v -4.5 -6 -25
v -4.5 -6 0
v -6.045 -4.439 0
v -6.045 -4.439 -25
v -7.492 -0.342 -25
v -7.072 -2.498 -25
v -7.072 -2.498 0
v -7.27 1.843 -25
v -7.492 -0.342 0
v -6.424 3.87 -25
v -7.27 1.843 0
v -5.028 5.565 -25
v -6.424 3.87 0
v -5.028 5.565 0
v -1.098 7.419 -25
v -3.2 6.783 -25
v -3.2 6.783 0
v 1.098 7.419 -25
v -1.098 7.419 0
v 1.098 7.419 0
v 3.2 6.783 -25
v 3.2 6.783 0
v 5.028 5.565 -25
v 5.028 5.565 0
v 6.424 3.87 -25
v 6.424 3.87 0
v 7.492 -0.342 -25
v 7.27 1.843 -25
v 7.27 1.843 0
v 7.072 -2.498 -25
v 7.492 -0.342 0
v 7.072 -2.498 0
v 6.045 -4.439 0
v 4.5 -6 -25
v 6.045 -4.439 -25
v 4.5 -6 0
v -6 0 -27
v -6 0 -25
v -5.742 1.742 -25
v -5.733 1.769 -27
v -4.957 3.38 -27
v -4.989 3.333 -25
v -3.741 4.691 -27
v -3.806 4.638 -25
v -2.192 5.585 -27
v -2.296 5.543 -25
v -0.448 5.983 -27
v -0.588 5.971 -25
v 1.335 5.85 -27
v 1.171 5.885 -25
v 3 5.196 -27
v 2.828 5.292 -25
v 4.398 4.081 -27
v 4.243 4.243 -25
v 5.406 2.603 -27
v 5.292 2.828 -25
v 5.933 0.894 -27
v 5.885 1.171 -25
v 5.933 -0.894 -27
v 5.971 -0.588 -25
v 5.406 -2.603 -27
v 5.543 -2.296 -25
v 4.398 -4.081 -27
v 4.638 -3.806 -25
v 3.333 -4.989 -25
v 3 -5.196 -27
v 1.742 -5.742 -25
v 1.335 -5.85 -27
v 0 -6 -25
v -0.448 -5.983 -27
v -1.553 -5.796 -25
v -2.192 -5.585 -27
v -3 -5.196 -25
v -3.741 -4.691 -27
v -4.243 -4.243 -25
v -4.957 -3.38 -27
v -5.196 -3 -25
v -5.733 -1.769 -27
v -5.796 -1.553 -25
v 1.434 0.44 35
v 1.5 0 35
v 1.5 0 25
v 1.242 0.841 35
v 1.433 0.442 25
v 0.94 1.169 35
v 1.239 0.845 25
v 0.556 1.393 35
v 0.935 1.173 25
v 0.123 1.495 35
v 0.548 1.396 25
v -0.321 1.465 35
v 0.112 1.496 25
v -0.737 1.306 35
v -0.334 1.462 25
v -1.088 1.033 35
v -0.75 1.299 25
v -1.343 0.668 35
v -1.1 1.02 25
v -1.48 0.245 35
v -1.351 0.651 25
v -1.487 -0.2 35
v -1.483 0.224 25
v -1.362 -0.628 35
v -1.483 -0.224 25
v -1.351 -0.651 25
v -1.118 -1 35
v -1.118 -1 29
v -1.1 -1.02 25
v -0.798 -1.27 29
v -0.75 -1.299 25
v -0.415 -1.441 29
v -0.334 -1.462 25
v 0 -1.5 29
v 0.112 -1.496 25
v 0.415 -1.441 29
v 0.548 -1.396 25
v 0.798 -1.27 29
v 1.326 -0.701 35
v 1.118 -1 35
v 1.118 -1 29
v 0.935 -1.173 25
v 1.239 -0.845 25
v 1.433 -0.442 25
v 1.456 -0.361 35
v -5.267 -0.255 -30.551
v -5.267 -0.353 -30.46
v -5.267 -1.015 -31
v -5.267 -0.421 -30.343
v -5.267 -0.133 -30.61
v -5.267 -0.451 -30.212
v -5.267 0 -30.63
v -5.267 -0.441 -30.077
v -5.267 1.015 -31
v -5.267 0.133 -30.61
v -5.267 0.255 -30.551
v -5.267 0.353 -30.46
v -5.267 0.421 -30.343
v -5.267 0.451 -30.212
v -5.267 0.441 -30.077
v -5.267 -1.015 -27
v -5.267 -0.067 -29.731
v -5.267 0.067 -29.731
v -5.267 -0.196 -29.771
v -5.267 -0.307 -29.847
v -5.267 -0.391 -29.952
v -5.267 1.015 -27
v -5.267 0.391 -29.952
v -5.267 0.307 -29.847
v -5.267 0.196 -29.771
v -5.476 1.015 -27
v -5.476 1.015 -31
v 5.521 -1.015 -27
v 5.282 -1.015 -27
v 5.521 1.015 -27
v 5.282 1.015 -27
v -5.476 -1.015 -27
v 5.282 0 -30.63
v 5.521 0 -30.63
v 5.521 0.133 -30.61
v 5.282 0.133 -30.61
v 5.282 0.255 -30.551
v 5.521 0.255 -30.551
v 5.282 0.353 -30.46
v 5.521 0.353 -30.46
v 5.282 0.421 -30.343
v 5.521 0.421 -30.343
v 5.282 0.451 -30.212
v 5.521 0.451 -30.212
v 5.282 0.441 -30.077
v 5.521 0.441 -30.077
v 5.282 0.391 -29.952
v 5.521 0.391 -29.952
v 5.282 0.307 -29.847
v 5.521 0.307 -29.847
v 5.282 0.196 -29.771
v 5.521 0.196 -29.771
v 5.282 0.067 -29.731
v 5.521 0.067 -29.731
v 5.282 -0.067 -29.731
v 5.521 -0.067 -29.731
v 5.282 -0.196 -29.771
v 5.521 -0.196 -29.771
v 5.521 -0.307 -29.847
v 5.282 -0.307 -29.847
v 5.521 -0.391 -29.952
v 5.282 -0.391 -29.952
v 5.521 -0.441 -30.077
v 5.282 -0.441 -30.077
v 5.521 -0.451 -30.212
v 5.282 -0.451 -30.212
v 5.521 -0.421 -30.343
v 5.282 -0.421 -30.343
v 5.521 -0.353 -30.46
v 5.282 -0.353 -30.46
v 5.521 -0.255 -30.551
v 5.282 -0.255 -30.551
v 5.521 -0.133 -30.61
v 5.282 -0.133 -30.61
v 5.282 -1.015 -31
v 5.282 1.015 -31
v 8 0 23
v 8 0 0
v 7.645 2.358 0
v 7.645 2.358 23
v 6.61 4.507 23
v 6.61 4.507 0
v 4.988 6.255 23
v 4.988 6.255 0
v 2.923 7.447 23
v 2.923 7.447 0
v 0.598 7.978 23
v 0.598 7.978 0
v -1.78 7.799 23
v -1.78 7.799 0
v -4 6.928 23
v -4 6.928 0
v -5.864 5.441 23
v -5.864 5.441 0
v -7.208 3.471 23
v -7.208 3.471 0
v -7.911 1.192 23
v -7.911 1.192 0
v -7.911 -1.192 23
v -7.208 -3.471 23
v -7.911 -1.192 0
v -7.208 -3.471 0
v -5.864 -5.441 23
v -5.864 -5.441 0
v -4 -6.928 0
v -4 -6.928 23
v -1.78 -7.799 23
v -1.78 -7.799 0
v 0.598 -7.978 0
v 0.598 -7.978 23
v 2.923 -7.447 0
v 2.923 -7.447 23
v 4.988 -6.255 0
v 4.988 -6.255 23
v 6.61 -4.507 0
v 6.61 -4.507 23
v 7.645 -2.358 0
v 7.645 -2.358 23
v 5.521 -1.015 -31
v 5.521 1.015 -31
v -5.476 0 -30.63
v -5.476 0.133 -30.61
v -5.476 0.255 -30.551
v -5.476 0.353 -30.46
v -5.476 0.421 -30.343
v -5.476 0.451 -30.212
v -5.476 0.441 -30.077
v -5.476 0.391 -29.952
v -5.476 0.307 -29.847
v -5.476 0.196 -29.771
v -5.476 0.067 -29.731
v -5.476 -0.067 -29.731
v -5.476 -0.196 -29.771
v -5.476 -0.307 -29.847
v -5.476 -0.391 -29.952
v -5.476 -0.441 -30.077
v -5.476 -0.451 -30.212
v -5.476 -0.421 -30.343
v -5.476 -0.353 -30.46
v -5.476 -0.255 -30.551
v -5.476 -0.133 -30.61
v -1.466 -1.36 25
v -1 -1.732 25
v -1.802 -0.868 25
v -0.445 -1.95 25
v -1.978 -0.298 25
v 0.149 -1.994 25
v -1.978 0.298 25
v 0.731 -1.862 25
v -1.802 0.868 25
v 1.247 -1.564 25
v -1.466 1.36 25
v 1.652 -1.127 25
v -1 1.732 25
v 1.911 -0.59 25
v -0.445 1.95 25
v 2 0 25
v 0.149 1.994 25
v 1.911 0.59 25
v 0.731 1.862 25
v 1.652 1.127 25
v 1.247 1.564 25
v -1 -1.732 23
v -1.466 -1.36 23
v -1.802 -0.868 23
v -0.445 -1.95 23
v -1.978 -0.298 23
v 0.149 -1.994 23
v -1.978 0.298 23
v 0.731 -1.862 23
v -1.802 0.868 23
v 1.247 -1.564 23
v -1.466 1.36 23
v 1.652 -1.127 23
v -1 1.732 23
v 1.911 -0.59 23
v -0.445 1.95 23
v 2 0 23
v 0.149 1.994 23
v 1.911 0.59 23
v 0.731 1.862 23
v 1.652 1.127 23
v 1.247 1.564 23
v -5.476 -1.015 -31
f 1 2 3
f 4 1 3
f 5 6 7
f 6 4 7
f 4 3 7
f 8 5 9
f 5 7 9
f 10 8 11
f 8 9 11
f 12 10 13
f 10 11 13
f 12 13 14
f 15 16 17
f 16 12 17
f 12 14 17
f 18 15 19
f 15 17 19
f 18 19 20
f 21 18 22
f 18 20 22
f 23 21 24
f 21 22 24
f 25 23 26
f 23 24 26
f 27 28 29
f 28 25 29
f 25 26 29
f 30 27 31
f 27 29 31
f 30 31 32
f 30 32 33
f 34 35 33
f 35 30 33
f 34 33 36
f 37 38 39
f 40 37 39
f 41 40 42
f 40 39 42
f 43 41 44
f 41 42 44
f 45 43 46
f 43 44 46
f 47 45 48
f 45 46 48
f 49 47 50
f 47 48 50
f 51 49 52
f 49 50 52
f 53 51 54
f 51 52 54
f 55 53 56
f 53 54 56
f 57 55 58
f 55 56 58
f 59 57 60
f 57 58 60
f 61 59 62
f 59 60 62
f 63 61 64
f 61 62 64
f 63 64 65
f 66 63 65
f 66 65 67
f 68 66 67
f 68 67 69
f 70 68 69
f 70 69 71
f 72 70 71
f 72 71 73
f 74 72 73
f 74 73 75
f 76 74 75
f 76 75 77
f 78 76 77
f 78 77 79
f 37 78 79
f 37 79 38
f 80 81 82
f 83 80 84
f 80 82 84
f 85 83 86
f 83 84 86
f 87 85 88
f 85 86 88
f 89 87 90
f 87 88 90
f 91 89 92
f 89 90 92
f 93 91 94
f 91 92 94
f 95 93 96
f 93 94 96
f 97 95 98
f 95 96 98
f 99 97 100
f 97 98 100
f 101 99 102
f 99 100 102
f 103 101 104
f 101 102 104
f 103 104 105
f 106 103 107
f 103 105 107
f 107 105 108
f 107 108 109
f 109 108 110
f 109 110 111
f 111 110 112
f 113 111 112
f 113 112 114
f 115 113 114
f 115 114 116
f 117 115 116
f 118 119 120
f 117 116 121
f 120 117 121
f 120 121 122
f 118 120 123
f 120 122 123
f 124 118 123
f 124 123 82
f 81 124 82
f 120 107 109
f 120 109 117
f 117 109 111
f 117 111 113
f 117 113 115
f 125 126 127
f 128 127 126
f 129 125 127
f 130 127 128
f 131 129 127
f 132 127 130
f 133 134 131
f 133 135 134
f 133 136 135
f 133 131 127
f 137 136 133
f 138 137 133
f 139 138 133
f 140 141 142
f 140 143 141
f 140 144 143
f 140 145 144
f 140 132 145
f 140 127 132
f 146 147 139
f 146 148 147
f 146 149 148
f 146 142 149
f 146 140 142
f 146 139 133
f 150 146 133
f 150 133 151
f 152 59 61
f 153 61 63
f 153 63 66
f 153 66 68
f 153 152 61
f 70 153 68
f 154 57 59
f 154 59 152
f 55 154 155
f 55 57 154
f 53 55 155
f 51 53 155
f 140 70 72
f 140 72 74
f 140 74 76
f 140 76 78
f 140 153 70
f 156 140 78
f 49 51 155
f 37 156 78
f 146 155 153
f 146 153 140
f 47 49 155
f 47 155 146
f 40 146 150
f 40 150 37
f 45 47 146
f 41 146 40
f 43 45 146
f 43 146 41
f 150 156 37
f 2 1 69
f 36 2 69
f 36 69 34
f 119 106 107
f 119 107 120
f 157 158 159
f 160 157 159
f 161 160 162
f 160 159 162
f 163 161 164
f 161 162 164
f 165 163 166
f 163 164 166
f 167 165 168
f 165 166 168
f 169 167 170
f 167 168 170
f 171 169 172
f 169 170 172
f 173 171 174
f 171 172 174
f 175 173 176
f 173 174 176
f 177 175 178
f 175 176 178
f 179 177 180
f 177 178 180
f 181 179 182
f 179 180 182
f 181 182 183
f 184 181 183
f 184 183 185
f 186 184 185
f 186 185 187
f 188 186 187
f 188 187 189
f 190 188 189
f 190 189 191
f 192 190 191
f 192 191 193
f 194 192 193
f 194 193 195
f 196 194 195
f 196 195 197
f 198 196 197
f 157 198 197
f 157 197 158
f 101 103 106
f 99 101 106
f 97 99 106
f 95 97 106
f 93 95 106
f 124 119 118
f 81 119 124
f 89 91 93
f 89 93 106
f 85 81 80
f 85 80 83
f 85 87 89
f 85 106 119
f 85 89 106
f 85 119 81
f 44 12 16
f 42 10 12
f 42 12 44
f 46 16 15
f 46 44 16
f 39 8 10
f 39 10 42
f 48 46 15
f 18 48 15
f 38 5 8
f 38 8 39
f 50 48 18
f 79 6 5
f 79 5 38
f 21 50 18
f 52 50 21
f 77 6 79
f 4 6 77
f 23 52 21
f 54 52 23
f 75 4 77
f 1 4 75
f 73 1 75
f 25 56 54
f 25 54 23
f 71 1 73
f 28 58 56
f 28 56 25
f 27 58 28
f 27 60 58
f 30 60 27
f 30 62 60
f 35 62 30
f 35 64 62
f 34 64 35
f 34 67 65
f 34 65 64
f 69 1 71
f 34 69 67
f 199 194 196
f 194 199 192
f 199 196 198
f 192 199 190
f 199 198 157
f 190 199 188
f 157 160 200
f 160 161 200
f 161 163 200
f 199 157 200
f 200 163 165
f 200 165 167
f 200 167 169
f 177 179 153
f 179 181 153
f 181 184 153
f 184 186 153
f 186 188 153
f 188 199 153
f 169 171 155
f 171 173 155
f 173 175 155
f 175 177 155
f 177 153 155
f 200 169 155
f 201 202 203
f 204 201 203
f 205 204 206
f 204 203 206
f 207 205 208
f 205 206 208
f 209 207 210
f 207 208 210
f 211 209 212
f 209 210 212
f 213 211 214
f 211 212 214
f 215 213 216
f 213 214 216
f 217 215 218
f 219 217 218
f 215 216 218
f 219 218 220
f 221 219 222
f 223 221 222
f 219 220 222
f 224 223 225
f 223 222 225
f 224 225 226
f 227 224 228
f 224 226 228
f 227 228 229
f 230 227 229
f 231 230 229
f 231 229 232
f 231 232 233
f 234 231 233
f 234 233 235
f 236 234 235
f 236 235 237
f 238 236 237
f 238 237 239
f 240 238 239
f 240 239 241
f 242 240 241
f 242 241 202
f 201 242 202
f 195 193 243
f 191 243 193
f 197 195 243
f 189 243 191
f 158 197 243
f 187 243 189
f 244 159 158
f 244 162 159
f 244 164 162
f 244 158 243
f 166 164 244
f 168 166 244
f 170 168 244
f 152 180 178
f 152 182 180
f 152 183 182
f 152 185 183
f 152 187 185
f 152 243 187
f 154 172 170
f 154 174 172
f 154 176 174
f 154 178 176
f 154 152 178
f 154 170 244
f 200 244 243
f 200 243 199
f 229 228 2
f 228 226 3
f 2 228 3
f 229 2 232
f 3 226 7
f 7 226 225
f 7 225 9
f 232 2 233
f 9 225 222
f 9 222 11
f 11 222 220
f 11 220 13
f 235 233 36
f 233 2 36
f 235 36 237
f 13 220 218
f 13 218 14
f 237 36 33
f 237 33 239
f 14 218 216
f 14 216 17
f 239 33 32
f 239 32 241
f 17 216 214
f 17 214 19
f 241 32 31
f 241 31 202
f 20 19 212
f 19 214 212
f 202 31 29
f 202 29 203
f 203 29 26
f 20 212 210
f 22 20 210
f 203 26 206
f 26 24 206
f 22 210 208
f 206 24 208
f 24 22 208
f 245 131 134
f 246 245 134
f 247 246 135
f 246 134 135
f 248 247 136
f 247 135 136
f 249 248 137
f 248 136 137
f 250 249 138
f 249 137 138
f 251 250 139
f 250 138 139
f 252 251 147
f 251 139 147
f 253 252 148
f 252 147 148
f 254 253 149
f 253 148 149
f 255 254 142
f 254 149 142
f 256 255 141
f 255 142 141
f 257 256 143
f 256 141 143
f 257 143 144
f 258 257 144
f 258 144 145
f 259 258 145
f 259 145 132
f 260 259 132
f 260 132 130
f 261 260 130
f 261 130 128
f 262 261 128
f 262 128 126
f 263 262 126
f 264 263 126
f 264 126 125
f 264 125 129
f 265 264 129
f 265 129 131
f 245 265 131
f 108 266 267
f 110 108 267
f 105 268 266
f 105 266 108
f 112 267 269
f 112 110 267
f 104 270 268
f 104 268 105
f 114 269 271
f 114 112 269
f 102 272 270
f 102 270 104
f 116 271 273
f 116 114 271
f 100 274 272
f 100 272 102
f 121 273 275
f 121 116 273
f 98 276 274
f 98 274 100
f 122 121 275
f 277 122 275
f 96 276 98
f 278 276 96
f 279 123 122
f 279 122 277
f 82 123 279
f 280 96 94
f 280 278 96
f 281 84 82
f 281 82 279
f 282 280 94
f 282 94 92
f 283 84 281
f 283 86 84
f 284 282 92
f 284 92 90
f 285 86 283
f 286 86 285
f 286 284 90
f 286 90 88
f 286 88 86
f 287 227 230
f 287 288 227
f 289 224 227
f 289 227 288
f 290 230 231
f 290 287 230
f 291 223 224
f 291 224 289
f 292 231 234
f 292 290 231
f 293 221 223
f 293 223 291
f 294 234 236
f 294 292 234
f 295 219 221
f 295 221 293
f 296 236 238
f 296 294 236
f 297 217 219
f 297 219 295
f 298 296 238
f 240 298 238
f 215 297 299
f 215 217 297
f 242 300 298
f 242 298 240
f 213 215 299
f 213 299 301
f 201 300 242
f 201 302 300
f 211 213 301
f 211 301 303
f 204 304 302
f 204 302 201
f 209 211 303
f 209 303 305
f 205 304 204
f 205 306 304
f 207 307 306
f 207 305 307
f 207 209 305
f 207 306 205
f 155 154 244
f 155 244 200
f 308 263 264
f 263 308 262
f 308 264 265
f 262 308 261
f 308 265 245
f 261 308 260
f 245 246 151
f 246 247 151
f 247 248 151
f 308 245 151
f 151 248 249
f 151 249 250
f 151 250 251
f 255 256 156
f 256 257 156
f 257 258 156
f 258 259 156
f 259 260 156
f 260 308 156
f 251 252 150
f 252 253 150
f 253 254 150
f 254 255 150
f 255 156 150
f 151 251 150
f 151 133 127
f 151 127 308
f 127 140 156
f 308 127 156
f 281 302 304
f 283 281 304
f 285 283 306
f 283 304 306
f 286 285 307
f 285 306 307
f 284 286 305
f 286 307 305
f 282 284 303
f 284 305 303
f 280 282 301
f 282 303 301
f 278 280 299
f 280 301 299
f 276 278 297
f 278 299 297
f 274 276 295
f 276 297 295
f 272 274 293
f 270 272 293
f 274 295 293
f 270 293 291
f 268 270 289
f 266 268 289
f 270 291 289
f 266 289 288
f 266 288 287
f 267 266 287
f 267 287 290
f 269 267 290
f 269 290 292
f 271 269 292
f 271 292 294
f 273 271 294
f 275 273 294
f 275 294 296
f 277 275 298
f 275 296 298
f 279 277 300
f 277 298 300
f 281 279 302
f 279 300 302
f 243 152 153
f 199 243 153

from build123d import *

# Parameters (mm, degrees)
SKETCH_1_R          = 8
EXTRUDE_1_DEPTH     = 23
SKETCH_2_R          = 6
EXTRUDE_2_DEPTH     = 27
SKETCH_3_R          = 1.5
EXTRUDE_3_DEPTH     = 12
SKETCH_4_R          = 2
EXTRUDE_4_DEPTH     = 2
SKETCH_5_R          = 7.5
EXTRUDE_6_DEPTH     = 25
CUT_EXTRUDE_2_DEPTH = 25
SKETCH_7_W          = 0.238746812
SKETCH_7_H          = 2.029347906
SKETCH_7_W_2        = 0.208903461
EXTRUDE_7_DEPTH     = 4
SKETCH_8_R          = 0.451828616
CUT_EXTRUDE_3_DEPTH = 40
SKETCH_9_W          = 4.595876138
SKETCH_9_H          = 0.537180328
CUT_EXTRUDE_4_DEPTH = 6


with BuildPart() as part:
    # 草图1 → 凸台-拉伸1 (new body)
    with BuildSketch(Plane.XY):
        Circle(SKETCH_1_R)
    extrude(amount=EXTRUDE_1_DEPTH)

    # 草图2 → 凸台-拉伸2 (add)
    with BuildSketch(Plane(origin=(0, 0, 0), x_dir=(-1, 0, 0), z_dir=(0, 0, -1))):
        Circle(SKETCH_2_R)
    extrude(amount=EXTRUDE_2_DEPTH)

    # 草图3 → 凸台-拉伸3 (add)
    with BuildSketch(Plane.XY.offset(23)):
        Circle(SKETCH_3_R)
    extrude(amount=EXTRUDE_3_DEPTH)

    # 草图4 → 凸台-拉伸4 (add)
    with BuildSketch(Plane.XY.offset(23)):
        Circle(SKETCH_4_R)
    extrude(amount=EXTRUDE_4_DEPTH)

    # 草图5 → 凸台-拉伸6 (add)
    with BuildSketch(Plane(origin=(0, 0, 0), x_dir=(-1, 0, 0), z_dir=(0, 0, -1))):
        with Locations(Location((0, 0, 0), (0, 0, 180))):
            Circle(SKETCH_5_R)
    extrude(amount=EXTRUDE_6_DEPTH)

    # 草图6 → 切除-拉伸2 (cut)
    with BuildSketch(Plane(origin=(0, 0, -25), x_dir=(-1, 0, 0), z_dir=(0, 0, -1))):
        Polygon((0, -6), (7.251934426, -6), (7.251934426, -9), (-7.072874317, -9), (-7.072874317, -6), align=None)
    extrude(amount=-CUT_EXTRUDE_2_DEPTH, mode=Mode.SUBTRACT)

    # 草图7 → 凸台-拉伸7 (add)
    with BuildSketch(Plane(origin=(0, 0, -27), x_dir=(-1, 0, 0), z_dir=(0, 0, -1))):
        with Locations((-5.40164663, 0)):
            Rectangle(SKETCH_7_W, SKETCH_7_H)
        with Locations((5.371803278, 0)):
            Rectangle(SKETCH_7_W_2, SKETCH_7_H)
    extrude(amount=EXTRUDE_7_DEPTH)

    # 草图8 → 切除-拉伸3 (cut)
    with BuildSketch(Plane(origin=(5.521020036, 0, 0), x_dir=(0, 0, -1), z_dir=(1, 0, 0))):
        with Locations((30.17785099, 0)):
            Circle(SKETCH_8_R)
    extrude(amount=-CUT_EXTRUDE_3_DEPTH, mode=Mode.SUBTRACT)

    # 草图9 → 切除-拉伸4 (cut)
    with BuildSketch(Plane.XY.offset(35)):
        with Locations((0, -1.268342441)):
            Rectangle(SKETCH_9_W, SKETCH_9_H)
    extrude(amount=-CUT_EXTRUDE_4_DEPTH, mode=Mode.SUBTRACT)


solid = part.part
